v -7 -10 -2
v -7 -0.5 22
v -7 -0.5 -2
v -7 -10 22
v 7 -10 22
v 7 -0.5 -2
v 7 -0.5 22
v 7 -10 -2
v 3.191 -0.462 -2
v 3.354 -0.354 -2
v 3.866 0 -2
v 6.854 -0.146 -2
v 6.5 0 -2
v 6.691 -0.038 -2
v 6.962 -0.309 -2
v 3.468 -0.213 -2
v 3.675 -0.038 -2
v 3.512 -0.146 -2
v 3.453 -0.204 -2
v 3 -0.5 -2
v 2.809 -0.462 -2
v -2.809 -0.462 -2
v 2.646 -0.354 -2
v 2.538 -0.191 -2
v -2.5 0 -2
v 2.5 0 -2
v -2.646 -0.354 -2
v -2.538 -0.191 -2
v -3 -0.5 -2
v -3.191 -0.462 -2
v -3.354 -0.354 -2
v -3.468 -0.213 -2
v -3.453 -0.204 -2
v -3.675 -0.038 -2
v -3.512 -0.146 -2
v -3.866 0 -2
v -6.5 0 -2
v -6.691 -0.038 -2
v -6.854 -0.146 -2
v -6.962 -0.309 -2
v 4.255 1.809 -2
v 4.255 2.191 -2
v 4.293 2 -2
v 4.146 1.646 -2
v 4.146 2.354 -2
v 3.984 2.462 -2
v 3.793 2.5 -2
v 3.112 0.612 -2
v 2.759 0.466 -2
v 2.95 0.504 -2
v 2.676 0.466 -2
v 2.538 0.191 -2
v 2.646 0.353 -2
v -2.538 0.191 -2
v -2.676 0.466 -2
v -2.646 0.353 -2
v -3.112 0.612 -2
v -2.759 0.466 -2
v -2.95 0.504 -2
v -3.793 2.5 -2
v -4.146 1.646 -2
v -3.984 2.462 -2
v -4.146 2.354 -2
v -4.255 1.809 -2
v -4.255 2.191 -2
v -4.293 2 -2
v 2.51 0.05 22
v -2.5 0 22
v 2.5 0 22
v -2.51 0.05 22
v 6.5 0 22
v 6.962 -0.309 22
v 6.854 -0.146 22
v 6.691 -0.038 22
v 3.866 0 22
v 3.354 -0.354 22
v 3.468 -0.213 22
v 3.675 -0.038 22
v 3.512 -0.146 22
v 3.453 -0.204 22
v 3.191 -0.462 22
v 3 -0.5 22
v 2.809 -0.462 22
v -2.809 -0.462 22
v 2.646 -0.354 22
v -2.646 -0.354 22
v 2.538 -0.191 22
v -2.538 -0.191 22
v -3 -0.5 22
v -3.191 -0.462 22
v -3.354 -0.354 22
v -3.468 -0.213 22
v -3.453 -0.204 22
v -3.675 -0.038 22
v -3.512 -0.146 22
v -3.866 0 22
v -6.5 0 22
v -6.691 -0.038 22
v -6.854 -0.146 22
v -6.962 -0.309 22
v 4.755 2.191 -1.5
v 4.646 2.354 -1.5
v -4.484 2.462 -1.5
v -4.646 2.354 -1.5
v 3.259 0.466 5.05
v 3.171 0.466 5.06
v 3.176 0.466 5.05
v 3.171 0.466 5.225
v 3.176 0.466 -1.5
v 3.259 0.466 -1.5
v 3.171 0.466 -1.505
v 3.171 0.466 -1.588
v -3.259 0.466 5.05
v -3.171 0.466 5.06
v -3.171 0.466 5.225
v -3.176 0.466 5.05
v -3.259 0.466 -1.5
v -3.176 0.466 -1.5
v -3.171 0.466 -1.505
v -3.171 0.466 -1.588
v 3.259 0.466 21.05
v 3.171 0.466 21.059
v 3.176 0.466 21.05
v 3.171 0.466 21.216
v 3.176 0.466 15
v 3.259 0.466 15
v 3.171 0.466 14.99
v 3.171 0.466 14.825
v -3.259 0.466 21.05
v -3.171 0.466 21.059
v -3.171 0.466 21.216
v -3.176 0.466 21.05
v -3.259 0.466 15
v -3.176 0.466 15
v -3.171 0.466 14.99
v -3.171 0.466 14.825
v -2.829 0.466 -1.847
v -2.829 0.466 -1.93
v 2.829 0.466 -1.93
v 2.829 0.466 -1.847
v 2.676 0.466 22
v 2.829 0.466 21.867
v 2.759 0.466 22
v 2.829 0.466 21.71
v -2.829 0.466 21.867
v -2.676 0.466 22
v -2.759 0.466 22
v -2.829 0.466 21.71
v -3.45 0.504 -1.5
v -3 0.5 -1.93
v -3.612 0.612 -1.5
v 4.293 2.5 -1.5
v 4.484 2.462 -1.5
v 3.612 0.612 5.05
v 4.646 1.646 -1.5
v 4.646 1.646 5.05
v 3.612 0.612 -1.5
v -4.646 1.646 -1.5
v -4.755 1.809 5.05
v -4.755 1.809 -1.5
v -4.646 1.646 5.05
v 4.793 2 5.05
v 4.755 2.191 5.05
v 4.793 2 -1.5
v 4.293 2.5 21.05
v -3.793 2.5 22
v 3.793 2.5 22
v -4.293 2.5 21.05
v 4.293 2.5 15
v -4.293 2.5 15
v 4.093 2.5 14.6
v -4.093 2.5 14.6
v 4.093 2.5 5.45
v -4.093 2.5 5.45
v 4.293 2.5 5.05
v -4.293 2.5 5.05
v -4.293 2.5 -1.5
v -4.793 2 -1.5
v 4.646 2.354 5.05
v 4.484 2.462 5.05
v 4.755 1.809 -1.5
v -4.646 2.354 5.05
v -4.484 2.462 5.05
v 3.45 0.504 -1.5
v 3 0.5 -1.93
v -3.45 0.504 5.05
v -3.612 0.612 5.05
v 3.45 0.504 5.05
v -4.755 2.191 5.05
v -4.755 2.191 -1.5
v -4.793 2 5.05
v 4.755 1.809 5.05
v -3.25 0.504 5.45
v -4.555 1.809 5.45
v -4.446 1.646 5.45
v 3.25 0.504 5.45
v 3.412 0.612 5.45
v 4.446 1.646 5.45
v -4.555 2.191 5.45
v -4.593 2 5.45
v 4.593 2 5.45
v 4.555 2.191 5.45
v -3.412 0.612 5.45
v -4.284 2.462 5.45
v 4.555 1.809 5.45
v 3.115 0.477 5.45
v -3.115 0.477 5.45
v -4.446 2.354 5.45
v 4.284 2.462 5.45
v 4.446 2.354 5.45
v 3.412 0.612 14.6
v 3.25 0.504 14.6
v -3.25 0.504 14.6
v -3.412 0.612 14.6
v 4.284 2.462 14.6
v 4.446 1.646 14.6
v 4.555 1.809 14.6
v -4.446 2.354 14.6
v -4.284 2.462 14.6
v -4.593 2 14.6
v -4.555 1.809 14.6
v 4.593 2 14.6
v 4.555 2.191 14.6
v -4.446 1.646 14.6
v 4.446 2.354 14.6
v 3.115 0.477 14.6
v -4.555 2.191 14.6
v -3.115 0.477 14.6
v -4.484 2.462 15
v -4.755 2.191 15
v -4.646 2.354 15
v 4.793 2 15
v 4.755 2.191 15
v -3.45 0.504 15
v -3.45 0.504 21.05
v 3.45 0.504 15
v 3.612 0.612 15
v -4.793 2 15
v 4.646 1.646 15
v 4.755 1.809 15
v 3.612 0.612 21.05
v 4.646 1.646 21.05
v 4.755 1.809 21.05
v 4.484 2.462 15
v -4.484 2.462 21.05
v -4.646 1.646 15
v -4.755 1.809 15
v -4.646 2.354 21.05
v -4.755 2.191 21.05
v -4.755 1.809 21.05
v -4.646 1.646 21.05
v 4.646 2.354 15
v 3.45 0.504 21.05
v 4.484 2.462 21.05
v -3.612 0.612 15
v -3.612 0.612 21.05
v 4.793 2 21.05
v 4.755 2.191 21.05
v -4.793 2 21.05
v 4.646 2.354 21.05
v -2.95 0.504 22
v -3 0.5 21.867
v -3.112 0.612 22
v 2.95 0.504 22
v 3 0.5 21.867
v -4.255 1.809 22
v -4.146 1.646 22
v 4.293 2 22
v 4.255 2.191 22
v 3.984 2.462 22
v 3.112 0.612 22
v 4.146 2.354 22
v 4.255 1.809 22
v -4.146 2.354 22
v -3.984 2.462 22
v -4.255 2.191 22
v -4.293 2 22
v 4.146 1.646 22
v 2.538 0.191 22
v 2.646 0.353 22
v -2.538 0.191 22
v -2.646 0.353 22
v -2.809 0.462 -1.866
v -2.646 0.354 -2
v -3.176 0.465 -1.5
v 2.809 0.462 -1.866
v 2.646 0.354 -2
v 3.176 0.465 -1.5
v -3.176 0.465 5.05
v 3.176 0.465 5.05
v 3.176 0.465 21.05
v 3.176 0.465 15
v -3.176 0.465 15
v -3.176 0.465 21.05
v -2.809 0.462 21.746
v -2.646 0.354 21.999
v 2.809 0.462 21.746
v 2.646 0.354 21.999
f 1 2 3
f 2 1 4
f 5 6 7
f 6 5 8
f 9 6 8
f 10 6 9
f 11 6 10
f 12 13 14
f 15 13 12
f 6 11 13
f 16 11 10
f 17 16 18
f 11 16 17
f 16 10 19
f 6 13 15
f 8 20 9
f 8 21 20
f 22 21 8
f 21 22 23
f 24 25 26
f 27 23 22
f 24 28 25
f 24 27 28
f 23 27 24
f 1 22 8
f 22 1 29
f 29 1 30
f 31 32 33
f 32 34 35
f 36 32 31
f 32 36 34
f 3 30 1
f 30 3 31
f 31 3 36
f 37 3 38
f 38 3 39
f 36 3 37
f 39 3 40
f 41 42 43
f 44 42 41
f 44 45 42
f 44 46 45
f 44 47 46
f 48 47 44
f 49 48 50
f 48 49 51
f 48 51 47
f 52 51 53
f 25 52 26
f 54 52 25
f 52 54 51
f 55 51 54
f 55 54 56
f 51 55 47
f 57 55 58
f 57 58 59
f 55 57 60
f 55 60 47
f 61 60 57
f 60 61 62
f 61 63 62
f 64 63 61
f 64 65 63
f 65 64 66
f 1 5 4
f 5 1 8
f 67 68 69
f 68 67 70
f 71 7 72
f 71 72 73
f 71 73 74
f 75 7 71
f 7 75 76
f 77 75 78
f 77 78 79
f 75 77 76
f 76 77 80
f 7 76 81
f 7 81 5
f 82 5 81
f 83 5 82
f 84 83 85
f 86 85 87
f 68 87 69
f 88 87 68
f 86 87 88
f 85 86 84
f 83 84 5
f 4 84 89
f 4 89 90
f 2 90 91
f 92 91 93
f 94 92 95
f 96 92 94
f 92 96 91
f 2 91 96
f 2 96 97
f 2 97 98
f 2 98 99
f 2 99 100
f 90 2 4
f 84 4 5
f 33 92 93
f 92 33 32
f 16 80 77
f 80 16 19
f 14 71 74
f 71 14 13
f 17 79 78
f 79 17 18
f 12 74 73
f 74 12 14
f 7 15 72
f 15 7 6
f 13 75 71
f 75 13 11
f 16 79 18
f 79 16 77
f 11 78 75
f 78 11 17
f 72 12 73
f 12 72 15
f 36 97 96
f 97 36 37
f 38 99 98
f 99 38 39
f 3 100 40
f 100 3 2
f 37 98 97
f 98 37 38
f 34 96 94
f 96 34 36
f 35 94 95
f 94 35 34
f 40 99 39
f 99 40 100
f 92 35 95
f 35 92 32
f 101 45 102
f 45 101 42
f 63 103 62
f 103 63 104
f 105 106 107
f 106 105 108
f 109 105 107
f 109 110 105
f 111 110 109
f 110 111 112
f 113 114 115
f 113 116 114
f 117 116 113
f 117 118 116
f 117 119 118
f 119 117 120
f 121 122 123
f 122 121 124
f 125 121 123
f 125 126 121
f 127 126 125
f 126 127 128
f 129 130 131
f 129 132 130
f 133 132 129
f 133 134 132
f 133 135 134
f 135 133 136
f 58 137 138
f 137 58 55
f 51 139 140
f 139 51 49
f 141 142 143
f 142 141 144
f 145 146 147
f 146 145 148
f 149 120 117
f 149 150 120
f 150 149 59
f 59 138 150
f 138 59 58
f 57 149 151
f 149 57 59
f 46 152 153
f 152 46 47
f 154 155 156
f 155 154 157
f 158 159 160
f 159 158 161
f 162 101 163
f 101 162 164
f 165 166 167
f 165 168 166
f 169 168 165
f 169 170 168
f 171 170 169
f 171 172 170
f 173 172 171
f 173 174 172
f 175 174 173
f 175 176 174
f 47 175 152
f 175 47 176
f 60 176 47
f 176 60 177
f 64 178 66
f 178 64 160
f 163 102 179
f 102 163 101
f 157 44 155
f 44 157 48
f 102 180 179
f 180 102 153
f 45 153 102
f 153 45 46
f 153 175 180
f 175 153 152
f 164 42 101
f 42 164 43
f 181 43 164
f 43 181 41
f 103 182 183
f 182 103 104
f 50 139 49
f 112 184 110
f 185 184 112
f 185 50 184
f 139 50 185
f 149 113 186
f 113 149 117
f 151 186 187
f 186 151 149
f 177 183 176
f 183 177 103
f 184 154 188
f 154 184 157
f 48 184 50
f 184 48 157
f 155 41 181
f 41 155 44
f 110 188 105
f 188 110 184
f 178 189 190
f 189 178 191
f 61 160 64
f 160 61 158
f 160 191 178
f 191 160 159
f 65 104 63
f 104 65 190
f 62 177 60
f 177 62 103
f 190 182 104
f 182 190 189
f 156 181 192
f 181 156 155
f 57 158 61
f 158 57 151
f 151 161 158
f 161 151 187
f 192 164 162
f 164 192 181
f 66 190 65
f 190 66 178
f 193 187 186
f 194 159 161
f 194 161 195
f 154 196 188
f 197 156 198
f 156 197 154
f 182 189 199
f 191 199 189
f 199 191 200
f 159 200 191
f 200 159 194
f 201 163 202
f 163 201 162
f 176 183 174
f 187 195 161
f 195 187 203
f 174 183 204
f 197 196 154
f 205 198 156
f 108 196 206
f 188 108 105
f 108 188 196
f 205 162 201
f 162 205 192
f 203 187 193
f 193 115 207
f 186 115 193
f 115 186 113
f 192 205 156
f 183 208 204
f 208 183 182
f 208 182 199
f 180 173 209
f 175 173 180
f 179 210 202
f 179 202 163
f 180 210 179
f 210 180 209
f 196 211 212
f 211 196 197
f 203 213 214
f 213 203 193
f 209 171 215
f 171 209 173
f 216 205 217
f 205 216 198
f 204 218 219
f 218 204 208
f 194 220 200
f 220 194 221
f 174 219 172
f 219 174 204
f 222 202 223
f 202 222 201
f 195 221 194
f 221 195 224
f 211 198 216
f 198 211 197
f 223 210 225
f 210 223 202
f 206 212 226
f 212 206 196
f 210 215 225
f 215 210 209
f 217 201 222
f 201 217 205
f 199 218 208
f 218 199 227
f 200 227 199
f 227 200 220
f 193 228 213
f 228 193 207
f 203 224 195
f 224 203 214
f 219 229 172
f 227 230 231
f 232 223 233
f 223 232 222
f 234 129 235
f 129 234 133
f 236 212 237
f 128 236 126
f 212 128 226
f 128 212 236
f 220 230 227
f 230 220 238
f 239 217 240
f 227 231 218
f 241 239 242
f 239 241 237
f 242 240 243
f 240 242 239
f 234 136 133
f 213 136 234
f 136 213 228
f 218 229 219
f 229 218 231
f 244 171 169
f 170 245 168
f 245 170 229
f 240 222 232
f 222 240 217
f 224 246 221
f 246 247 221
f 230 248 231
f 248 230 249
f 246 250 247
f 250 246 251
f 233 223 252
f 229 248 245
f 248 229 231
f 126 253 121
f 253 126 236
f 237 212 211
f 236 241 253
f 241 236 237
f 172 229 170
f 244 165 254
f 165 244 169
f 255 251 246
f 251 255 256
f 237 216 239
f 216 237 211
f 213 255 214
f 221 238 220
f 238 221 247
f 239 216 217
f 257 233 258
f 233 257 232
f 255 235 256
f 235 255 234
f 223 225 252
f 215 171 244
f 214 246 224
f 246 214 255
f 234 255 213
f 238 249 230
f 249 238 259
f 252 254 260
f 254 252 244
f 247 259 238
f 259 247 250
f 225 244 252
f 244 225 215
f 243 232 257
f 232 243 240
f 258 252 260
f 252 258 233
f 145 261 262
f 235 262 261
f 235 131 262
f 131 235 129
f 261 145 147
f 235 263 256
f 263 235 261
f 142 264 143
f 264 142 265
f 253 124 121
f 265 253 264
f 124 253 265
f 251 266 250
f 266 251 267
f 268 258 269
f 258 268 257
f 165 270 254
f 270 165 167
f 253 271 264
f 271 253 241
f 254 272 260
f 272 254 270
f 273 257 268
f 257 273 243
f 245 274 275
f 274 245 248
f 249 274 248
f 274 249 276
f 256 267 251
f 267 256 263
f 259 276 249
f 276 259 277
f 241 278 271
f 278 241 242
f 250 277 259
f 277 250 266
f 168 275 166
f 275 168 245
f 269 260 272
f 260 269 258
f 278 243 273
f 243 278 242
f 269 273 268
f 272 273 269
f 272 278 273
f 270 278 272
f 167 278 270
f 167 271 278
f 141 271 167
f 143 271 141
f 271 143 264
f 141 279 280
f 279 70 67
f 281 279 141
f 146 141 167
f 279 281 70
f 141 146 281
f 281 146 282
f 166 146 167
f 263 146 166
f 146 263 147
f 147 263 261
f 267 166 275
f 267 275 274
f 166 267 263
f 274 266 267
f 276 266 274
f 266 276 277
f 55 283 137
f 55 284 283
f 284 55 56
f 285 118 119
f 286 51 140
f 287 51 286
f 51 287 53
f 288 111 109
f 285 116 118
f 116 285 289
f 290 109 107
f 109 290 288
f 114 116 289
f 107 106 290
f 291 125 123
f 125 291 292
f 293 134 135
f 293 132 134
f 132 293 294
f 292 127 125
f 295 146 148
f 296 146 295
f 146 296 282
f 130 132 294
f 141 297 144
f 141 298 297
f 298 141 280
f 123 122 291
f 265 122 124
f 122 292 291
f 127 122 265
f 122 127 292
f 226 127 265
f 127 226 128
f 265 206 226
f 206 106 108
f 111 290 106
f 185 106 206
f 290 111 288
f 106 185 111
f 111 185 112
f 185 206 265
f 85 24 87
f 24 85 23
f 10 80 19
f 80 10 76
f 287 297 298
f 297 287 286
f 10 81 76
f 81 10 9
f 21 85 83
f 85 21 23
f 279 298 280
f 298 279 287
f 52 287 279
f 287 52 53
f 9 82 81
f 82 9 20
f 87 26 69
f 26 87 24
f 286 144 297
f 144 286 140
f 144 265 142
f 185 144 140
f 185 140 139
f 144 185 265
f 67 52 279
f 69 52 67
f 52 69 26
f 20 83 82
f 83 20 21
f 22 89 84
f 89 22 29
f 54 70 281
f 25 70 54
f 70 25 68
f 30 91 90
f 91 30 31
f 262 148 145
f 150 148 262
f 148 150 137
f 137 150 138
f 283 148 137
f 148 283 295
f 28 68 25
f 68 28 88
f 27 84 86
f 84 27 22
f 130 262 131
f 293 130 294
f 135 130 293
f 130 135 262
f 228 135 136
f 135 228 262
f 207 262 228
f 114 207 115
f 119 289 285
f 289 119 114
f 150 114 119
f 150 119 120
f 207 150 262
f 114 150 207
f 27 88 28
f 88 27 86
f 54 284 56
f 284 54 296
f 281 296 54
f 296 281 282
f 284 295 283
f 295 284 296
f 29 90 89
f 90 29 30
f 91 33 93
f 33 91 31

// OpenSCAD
/******************************************************************
*                                                                 *
* OpenFlexure Microscope: Dovetail                                *
*                                                                 *
* This is part of the OpenFlexure microscope, an open-source      *
* microscope and 3-axis translation stage.  It gets really good   *
* precision over a ~10mm range, by using plastic flexure          *
* mechanisms.                                                     *
*                                                                 *
* This file deals with the dovetail clips that are used to hold   *
* the objective and illumination, and provide coarse Z adjustment.*
*                                                                 *
* (c) Richard Bowman, January 2016                                *
* Released under the CERN Open Hardware License                   *
*                                                                 *
******************************************************************/

use <./utilities.scad>
$fn=16;


module dovetail_clip_cutout(size,dt=1.5,t=2,slope_front=0,solid_bottom=0){
    // This will form a female dovetail when subtracted from a block.
    // cut this out of a cube (of size "size", with one edge centred along
    // the X axis extending into +y, +z
    //
    // dt sets the size of the 45-degree clips
    // t sets the thickness of the dovetail arms (2mm is good)
    // slope_front cuts off the bottom of the ends of the arms, i.e.
    //   the part that does the gripping starts above Z=0.  This can
    //   avoid the splodginess that comes from the bottom few layers,
    //   and make it print much better - useful if you want to insert
    //   things from the bottom.
    // solid_bottom joins the bottoms of the arms with a thin layer.
    //   this can help it stick to the print bed.
    //
    // I reccommend using ~8-10mm arms for a tight fit.  On all my
    // printers, the ooze of the plastic is enough to keep it tight, so I
    // set the size of the M and F dovetails to be identical.  You might
    // want to make it tighter, either by increasing dt slightly or by
    // decreasing the size slightly (in both cases, of this, the female
    // dovetail).
    // NB that it starts at z=-tiny() and stops at z=size.z+tiny() to make
    // it easy to subtract from a block.

    cutout_bottom = solid_bottom > 0 ? solid_bottom+tiny() : -tiny();
    inner_w = size.x - 2*t; // width between arms

    hull() reflect([1,0,0]) translate([-size.x/2+t,0,cutout_bottom]){
        translate([dt,size.y-dt,0]) cylinder(r=dt,h=size.z+2*tiny(),$fn=16);
        translate([0,dt,0]) rotate(-45) cube([dt*2,tiny(),size.z+2*tiny()]);
    }

    if(slope_front>0){
        //sloped bottom to improve quality of the dovetail clip and
        //allow insertion of the male dovetail from the bottom
        rotate([45,0,0]) cube([999,1,1]*sqrt(2)*slope_front,center=true); //slope up arms
        //also, slope in the dovetail tooth to avoid marring at the bottom:
        hull() reflect([0,0,1]) translate([0,0,slope_front])
            rotate([0,45,0]) cube([(inner_w)/sqrt(2),dt*2,inner_w/sqrt(2)],center=true);
    }
}
module dovetail_clip(size=[10,2,10],dt=1.5,t=2,back_t=0,slope_front=0,solid_bottom=0){
    // This forms a clip that will grip a dovetail, with the
    // contact between the m/f parts in the y=0 plane.
    // This is the female part, and it is centred in X and
    // extends into +y, +z.
    // The outer dimensions of the clip are given by size.
    // dt sets the size of the clip's teeth, and t is the
    // thickness of the arms.  By default it has no back, and
    // should be attached to a solid surface.  Specifying back_t>0
    // will add material at the back (by shortening the arms).
    // slope_front will add a sloped section to the front of the arms.
    // this can improve the quality of the bottom of the dovetail
    // (good if you're inserting from the bottom)
    // solid_bottom will join the arms together at the bottom, which
    // can help with bed adhesion.
    // see dovetail_clip_cutout - most of the options are just passed through.
    difference(){
        translate([-size.x/2,0,0]) cube(size);
        dovetail_clip_cutout(size-[0,back_t+tiny(),0],dt=dt,t=t,slope_front=slope_front,solid_bottom=solid_bottom);
    }
}

module dovetail_plug(corner_x, r, dt, zx_profile=[[0,0],[10,0],[12,-1]]){
    // Just the "plug" of a male dovetail (i.e. not the flat surface
    // it's attached to, just the bit that fits inside the female).
    // zx_profile is a list of 2-element vectors, each of which defines
    //   a point in Z-X space, i.e. first element is height and second
    //   is the shift in the corner position.  For example,
    //   zx_profile=[[0,0],[10,0],[12,-1]] creates a plug 12mm+tiny() high
    //   where the top 2mm are sloped at 60 degrees.  NB the use of tiny().
    union(){
        // sorry for the copy-paste code; I'm fairly sure it's less readable
        // if I arrange things in a way that avoids it...
        // four fat cylinders make the contact point
        for(i=[0:len(zx_profile)-2]){
            hull() for(j=[0:1]){
                z = zx_profile[i+j][0];
                x = zx_profile[i+j][1];
                reflect([1,0,0]) translate([corner_x+x,0,z]) rotate(45) translate([sqrt(3)*r,r,0]) repeat([dt*sqrt(2) - (1+sqrt(3))*r,0,0],2) cylinder(r=r,h=tiny());
            }
        }
        // another four cylinders join the plug to the y=0 plane
        for(i=[0:len(zx_profile)-2]){
            hull() for(j=[0:1]){
                z = zx_profile[i+j][0];
                x = zx_profile[i+j][1];
                reflect([1,0,0]) translate([corner_x+x,0,z]) rotate(45) repeat([sqrt(3)*r,r,0],2) cylinder(r=tiny(),h=tiny());
            }
        }
    }
}
module dovetail_m(size=[10,2,10],dt=1.5,t=2,top_taper=1,bottom_taper=0.5,waist=0,waist_dx=0.5,r=0.5){
    // Male dovetail, contact plane is y=0, dovetail is in y>0
    // size is a box that is centred in X, sits on Z=0, and extends
    // in the -y direction from y=0.  This is the mount for the
    // dovetail, which sits in the +y direction.
    // The width of the box should be the same as the width of the
    // female dovetail clip.  The size of the dovetail is set by dt.
    // t sets the thickness of the female dovetail arms; the dovetail
    // is actually size.x-2*t wide.
    r=r; //radius of curvature - something around nozzle width is good.
    w=size.x-2*t; //width of dovetail
    h=size.z; //height
    corner=[w/2-dt,0,0]; //location of the pointy bit of the dovetail
    difference(){
        union(){
            //back of the dovetail (the mount) plus the start of the
            //dovetail's neck (as far as y=0)
            sequential_hull(){
                // start with the cube that the dovetail attaches to
                translate([-w/2-t,-size.y,0]) cube([w+2*t,size.y-r,h]);
                // then add shapes that take in the centres of the cylinders
                // from the next step.  This joins together the nicely-rounded
                // contact points, such that when we subtract out the cylinders
                // at the corners we get a nice smooth shape.
                reflect([1,0,0]) translate(corner+[sqrt(3)*r,-r,0]) cylinder(r=tiny(),h=h);
                reflect([1,0,0]) translate(corner) cylinder(r=tiny(),h=h);
            }
            //contact points (with rounded edges to avoid burrs)
            difference(){
                union(){
                    reflect([1,0,0]) hull(){
                        translate(corner+[sqrt(3)*r,-r,0]) cylinder(r=r,h=h);    
                        translate([w/2+t-r,-r,0]) cylinder(r=r,h=h);    
                    }
                    //hull() reflect([1,0,0]) translate(corner) rotate(45) translate([sqrt(3)*r,r,0]) repeat([1,0,0],2) cylinder(r=r,h=h);
                    // the "plug" is tapered for easy insertion, and may
                    // have optional indents in the middle (a "waist").
                    waist_dx = waist>waist_dx*4 ? waist_dx : 0;
                    waist_dz = waist>waist_dx*4 ? waist_dx*2 : tiny();
                    zx_profile = [[0,-bottom_taper],
                                  [bottom_taper,0],
                                  [h/2-waist/2,0],
                                  [h/2-waist/2+waist_dz,-waist_dx],
                                  [h/2+waist/2-waist_dz,-waist_dx],
                                  [h/2+waist/2,0],
                                  [h-top_taper,0],
                                  [h-tiny(),-top_taper/2]];
                    dovetail_plug(corner.x, r, dt, zx_profile);

                }
            }
        }
        // We round out the internal corner so that we grip with the edges
        // of the tooth and not the point (you get better contact this way).
        reflect([1,0,0]) translate(corner) cylinder(r=r,h=3*h,center=true);
    }
}

module dovetail_clip_y(size, dt=1.5, t=2, taper=0, endstop=false){
    // Make a dovetail where the sliding axis is along y, i.e. horizontal
    // This means it's the top of the object that grips the dovetail.
    //
    // the x and y elements of size set the dovetail width and "height"
    // the z element sets the distance from the end of the teeth (z=0) to
    // the bottom of the mount.
    // dt is the size of the dovetail teeth
    // endstop enables a link on the other side of the Y axis, to stop motion there.
    // endstop_w, endstop_t set the width and thickness (in y and z) of the link
    // taper optionally feathers the dovetail onto an edge
    // the dovetail extends along the +y direction from y=0
    h = size.y;
    ew = 0;//endstop ? endstop_w : 0;
    reflect([1,0,0]) translate([-size.x/2,0,0]) mirror([0,0,1]) sequential_hull(){
        translate([0,dt,0]) cube([t+dt,h-2*dt,tiny()]);
        cube([t,h,dt]);
        translate([0,-ew,0]) cube([t,h+ew,dt]);
        translate([0,-taper,size.z-tiny()]) cube([t,h+2*taper,tiny()]);
    }
    if(endstop){
        difference(){
            hull(){ // make a bridge between the lower tapers
                translate([0,-taper/2,-size.z+tiny()]) cube([size.x,taper,2*tiny()],center=true);
                translate([0,0,-tiny()]) cube([size.x,tiny(),2*tiny()],center=true);
            }
            translate([0,0,-size.z+0.5+999/2]) cube([(size.x-2*t-2*dt)-2,999,999],center=true); //cut the middle
            translate([0,-taper/2,-size.z]) cube([size.x,taper-1.5,0.5*2+tiny()],center=true);
        }
    }
}
//dovetail_clip_y([12,12,3],taper=2,endstop=true);
///
test_size = [14,10,24];
test_dt = 2;
//color("blue") dovetail_clip(test_size,dt=test_dt,slope_front=3,solid_bottom=0.5);
color("green") translate([0,0,-2]) dovetail_m(test_size, waist=10, dt=test_dt,waist_dx=0.2);
//*/
